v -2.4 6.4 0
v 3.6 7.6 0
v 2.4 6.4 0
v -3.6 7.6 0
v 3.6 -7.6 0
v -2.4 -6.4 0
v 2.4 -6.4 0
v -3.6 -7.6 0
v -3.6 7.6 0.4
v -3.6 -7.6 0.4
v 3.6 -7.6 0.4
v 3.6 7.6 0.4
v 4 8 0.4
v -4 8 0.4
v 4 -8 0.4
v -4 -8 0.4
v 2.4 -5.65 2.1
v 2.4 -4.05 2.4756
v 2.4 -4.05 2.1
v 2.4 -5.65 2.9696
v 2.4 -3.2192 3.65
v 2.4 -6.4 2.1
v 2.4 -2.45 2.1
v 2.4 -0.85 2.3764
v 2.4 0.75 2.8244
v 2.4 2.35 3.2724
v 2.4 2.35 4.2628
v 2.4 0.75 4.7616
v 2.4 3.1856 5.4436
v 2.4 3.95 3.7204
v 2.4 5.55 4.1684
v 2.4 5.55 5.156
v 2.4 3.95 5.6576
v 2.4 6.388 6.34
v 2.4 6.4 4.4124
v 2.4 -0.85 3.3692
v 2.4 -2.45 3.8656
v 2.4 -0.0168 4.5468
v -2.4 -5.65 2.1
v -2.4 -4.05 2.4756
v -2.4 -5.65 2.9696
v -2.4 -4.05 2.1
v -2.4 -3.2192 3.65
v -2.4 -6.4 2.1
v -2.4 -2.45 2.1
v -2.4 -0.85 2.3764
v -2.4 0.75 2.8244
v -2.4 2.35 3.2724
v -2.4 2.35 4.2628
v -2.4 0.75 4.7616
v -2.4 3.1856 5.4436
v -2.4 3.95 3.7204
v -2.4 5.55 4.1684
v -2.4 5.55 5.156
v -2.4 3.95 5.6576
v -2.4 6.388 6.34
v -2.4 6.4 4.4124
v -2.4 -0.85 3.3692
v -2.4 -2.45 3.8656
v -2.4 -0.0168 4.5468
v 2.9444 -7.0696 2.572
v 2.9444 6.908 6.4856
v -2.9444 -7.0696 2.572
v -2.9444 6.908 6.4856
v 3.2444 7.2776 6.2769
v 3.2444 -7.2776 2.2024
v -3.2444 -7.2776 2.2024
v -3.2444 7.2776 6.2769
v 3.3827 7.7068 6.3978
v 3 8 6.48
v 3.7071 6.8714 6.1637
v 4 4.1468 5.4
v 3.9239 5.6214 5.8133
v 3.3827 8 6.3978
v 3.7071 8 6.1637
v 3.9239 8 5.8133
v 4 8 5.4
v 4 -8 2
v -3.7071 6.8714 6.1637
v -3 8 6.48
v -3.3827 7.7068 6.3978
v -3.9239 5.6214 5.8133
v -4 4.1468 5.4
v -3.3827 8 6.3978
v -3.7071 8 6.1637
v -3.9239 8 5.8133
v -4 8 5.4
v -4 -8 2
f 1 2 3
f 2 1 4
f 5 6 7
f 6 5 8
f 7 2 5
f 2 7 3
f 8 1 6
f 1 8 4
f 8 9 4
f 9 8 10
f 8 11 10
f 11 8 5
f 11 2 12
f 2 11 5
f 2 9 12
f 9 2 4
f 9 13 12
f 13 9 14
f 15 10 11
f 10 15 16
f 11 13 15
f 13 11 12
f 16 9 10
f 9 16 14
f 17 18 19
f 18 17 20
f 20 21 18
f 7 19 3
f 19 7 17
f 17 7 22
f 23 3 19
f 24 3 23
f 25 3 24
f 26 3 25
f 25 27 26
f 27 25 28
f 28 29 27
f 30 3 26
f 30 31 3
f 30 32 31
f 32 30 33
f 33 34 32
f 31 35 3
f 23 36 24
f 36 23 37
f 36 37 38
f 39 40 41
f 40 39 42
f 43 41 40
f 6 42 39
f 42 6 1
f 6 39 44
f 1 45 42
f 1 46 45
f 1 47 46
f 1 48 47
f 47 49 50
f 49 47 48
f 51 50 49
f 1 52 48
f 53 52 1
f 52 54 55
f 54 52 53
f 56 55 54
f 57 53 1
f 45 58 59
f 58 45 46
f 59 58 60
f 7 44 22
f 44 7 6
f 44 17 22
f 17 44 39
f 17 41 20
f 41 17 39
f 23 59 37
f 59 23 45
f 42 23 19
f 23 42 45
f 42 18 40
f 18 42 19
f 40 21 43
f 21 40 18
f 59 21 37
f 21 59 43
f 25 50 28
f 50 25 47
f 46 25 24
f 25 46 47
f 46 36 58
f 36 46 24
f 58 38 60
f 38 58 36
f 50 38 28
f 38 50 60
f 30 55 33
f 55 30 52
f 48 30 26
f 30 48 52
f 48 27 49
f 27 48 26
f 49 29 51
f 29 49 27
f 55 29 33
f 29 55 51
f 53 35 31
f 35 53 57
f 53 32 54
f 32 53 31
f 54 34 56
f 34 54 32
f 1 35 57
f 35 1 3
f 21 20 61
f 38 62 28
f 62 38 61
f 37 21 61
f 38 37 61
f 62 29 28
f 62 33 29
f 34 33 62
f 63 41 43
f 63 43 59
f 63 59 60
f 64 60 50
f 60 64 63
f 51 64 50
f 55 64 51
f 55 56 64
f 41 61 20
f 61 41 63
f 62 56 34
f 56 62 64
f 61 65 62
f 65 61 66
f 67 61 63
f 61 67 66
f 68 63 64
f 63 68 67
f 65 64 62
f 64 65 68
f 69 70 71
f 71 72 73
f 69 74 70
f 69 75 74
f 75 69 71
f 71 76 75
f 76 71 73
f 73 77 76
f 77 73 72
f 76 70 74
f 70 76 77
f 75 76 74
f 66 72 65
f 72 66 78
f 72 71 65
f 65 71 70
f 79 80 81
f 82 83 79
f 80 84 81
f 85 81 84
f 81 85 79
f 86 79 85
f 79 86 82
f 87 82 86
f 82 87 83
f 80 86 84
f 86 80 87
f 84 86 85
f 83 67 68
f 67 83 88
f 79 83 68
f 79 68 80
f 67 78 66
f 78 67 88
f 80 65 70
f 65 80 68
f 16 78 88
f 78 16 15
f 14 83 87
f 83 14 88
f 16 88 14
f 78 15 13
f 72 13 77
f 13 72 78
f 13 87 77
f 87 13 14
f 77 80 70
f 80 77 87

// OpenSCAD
// file: ../p/recte4.scad
use <../lib.scad>
function ldraw_lib__recte4() = [
// 0 Rectangle Empty with 4 Edges
// 0 Name: recte4.dat
// 0 Author: Steffen [Steffen]
// 0 !LDRAW_ORG Primitive UPDATE 2010-03
// 0 !LICENSE Licensed under CC BY 4.0 : see CAreadme.txt
// 
// 0 BFC CERTIFY CCW
  [0,"BFC","CERTIFY"],
  [0,"BFC","CCW"],
// 
// 0 !HISTORY 2010-12-31 [PTadmin] Official Update 2010-03
// 
// 
// 2 24 1 0 1 -1 0 1
  [2,24,1,0,1,-1,0,1],
// 2 24 -1 0 1 -1 0 -1
  [2,24,-1,0,1,-1,0,-1],
// 2 24 -1 0 -1 1 0 -1
  [2,24,-1,0,-1,1,0,-1],
// 2 24 1 0 -1 1 0 1
  [2,24,1,0,-1,1,0,1],
];
module ldraw_lib__recte4(step=0, col=false, unit=2/5, alt=false, line=0.2, solid=!$preview)
    makepoly(ldraw_lib__recte4(), step=step, col=col, unit=unit, alt=alt, line=line, solid=solid);
ldraw_lib__recte4(line=0.2);
// file: ../p/rect3.scad
use <../lib.scad>
function ldraw_lib__rect3() = [
// 0 Rectangle with 3 Edges
// 0 Name: rect3.dat
// 0 Author: Mark Kennedy [mkennedy]
// 0 !LDRAW_ORG Primitive UPDATE 2010-01
// 0 !LICENSE Licensed under CC BY 4.0 : see CAreadme.txt
// 
// 0 BFC CERTIFY CCW
  [0,"BFC","CERTIFY"],
  [0,"BFC","CCW"],
// 
// 0 !HISTORY 2003-08-01 [PTadmin] Official Update 2003-02
// 0 !HISTORY 2007-06-24 [PTadmin] Header formatted for Contributor Agreement
// 0 !HISTORY 2008-07-01 [PTadmin] Official Update 2008-01
// 0 !HISTORY 2010-01-17 [mikeheide] Change winding to CCW
// 0 !HISTORY 2010-04-05 [PTadmin] Official Update 2010-01
// 
// 
// 2 24 1 0 1 -1 0 1
  [2,24,1,0,1,-1,0,1],
// 2 24 1 0 1 1 0 -1
  [2,24,1,0,1,1,0,-1],
// 2 24 -1 0 1 -1 0 -1
  [2,24,-1,0,1,-1,0,-1],
// 4 16 -1 0 1 -1 0 -1 1 0 -1 1 0 1
  [4,16,-1,0,1,-1,0,-1,1,0,-1,1,0,1],
// 0 //
];
module ldraw_lib__rect3(step=0, col=false, unit=2/5, alt=false, line=0.2, solid=!$preview)
    makepoly(ldraw_lib__rect3(), step=step, col=col, unit=unit, alt=alt, line=line, solid=solid);
ldraw_lib__rect3(line=0.2);
// file: ../p/rect2p.scad
use <../lib.scad>
function ldraw_lib__rect2p() = [
// 0 Rectangle with 2 Parallel Edges
// 0 Name: rect2p.dat
// 0 Author: Donald Sutter [technog]
// 0 !LDRAW_ORG Primitive UPDATE 2010-01
// 0 !LICENSE Licensed under CC BY 4.0 : see CAreadme.txt
// 
// 0 BFC CERTIFY CCW
  [0,"BFC","CERTIFY"],
  [0,"BFC","CCW"],
// 
// 0 !HISTORY 2003-08-01 [PTadmin] Official Update 2003-02
// 0 !HISTORY 2007-06-24 [PTadmin] Header formatted for Contributor Agreement
// 0 !HISTORY 2008-07-01 [PTadmin] Official Update 2008-01
// 0 !HISTORY 2010-01-17 [mikeheide] changed winding to CCW
// 0 !HISTORY 2010-04-05 [PTadmin] Official Update 2010-01
// 
// 
// 2 24 1 0 1 -1 0 1
  [2,24,1,0,1,-1,0,1],
// 2 24 -1 0 -1 1 0 -1
  [2,24,-1,0,-1,1,0,-1],
// 4 16 -1 0 1 -1 0 -1 1 0 -1 1 0 1
  [4,16,-1,0,1,-1,0,-1,1,0,-1,1,0,1],
// 0
];
module ldraw_lib__rect2p(step=0, col=false, unit=2/5, alt=false, line=0.2, solid=!$preview)
    makepoly(ldraw_lib__rect2p(), step=step, col=col, unit=unit, alt=alt, line=line, solid=solid);
ldraw_lib__rect2p(line=0.2);
// file: ../p/rect.scad
use <../lib.scad>
function ldraw_lib__rect() = [
// 0 Rectangle
// 0 Name: rect.dat
// 0 Author: James Jessiman
// 0 !LDRAW_ORG Primitive UPDATE 2010-01
// 0 !LICENSE Licensed under CC BY 4.0 : see CAreadme.txt
// 
// 0 BFC CERTIFY CCW
  [0,"BFC","CERTIFY"],
  [0,"BFC","CCW"],
// 
// 0 !HISTORY 2002-04-05 [hafhead] Added BFC statement
// 0 !HISTORY 2002-04-25 [PTadmin] Official Update 2002-02
// 0 !HISTORY 2007-06-24 [PTadmin] Header formatted for Contributor Agreement
// 0 !HISTORY 2008-07-01 [PTadmin] Official Update 2008-01
// 0 !HISTORY 2010-01-17 [mikeheide] changed winding to CCW
// 0 !HISTORY 2010-04-05 [PTadmin] Official Update 2010-01
// 
// 
// 2 24 1 0 1 -1 0 1
  [2,24,1,0,1,-1,0,1],
// 2 24 -1 0 1 -1 0 -1
  [2,24,-1,0,1,-1,0,-1],
// 2 24 -1 0 -1 1 0 -1
  [2,24,-1,0,-1,1,0,-1],
// 2 24 1 0 -1 1 0 1
  [2,24,1,0,-1,1,0,1],
// 4 16 -1 0 1 -1 0 -1 1 0 -1 1 0 1
  [4,16,-1,0,1,-1,0,-1,1,0,-1,1,0,1],
// 0
];
module ldraw_lib__rect(step=0, col=false, unit=2/5, alt=false, line=0.2, solid=!$preview)
    makepoly(ldraw_lib__rect(), step=step, col=col, unit=unit, alt=alt, line=line, solid=solid);
ldraw_lib__rect(line=0.2);
// file: ../p/box4.scad
use <../lib.scad>
function ldraw_lib__box4() = [
// 0 Box with 4 Faces (2 Parallel Pairs) and All Edges
// 0 Name: box4.dat
// 0 Author: James Jessiman
// 0 !LDRAW_ORG Primitive UPDATE 2012-01
// 0 !LICENSE Licensed under CC BY 4.0 : see CAreadme.txt
// 
// 0 BFC CERTIFY CCW
  [0,"BFC","CERTIFY"],
  [0,"BFC","CCW"],
// 
// 0 !HISTORY 2002-04-03 [sbliss] Modified for BFC compliance
// 0 !HISTORY 2002-04-25 [PTadmin] Official Update 2002-02
// 0 !HISTORY 2007-06-24 [PTadmin] Header formatted for Contributor Agreement
// 0 !HISTORY 2008-07-01 [PTadmin] Official Update 2008-01
// 0 !HISTORY 2012-02-16 [Philo] Changed to CCW
// 0 !HISTORY 2012-03-30 [PTadmin] Official Update 2012-01
// 
// 
// 2 24 1 1 1 -1 1 1
  [2,24,1,1,1,-1,1,1],
// 2 24 -1 1 1 -1 1 -1
  [2,24,-1,1,1,-1,1,-1],
// 2 24 -1 1 -1 1 1 -1
  [2,24,-1,1,-1,1,1,-1],
// 2 24 1 1 -1 1 1 1
  [2,24,1,1,-1,1,1,1],
// 2 24 1 0 1 -1 0 1
  [2,24,1,0,1,-1,0,1],
// 2 24 -1 0 1 -1 0 -1
  [2,24,-1,0,1,-1,0,-1],
// 2 24 -1 0 -1 1 0 -1
  [2,24,-1,0,-1,1,0,-1],
// 2 24 1 0 -1 1 0 1
  [2,24,1,0,-1,1,0,1],
// 2 24 1 0 1 1 1 1
  [2,24,1,0,1,1,1,1],
// 2 24 -1 0 1 -1 1 1
  [2,24,-1,0,1,-1,1,1],
// 2 24 1 0 -1 1 1 -1
  [2,24,1,0,-1,1,1,-1],
// 2 24 -1 0 -1 -1 1 -1
  [2,24,-1,0,-1,-1,1,-1],
// 4 16 -1 1 1 -1 0 1 1 0 1 1 1 1
  [4,16,-1,1,1,-1,0,1,1,0,1,1,1,1],
// 4 16 -1 1 -1 -1 0 -1 -1 0 1 -1 1 1
  [4,16,-1,1,-1,-1,0,-1,-1,0,1,-1,1,1],
// 4 16 1 1 -1 1 0 -1 -1 0 -1 -1 1 -1
  [4,16,1,1,-1,1,0,-1,-1,0,-1,-1,1,-1],
// 4 16 1 1 1 1 0 1 1 0 -1 1 1 -1
  [4,16,1,1,1,1,0,1,1,0,-1,1,1,-1],
];
module ldraw_lib__box4(step=0, col=false, unit=2/5, alt=false, line=0.2, solid=!$preview)
    makepoly(ldraw_lib__box4(), step=step, col=col, unit=unit, alt=alt, line=line, solid=solid);
ldraw_lib__box4(line=0.2);
// file: ../p/1-8chrd.scad
use <../lib.scad>
function ldraw_lib__1_8chrd() = [
// 0 Chord 0.125
// 0 Name: 1-8chrd.dat
// 0 Author: Orion Pobursky [OrionP]
// 0 !LDRAW_ORG Primitive UPDATE 2023-05
// 0 !LICENSE Licensed under CC BY 4.0 : see CAreadme.txt
// 
// 0 BFC CERTIFY CCW
  [0,"BFC","CERTIFY"],
  [0,"BFC","CCW"],
// 
// 0 !HISTORY 2004-04-22 [PTadmin] Official Update 2004-02
// 0 !HISTORY 2007-06-22 [PTadmin] Header formatted for Contributor Agreement
// 0 !HISTORY 2008-07-01 [PTadmin] Official Update 2008-01
// 0 !HISTORY 2023-10-27 [OrionP] Rebuilt with PrimGen2, original author westrate
// 0 !HISTORY 2023-10-31 [OrionP] Official Update 2023-05
// 
// 3 16 1 0 0 0.9239 0 0.3827 0.7071 0 0.7071
  [3,16,1,0,0,0.9239,0,0.3827,0.7071,0,0.7071],
];
module ldraw_lib__1_8chrd(step=0, col=false, unit=2/5, alt=false, line=0.2, solid=!$preview)
    makepoly(ldraw_lib__1_8chrd(), step=step, col=col, unit=unit, alt=alt, line=line, solid=solid);
ldraw_lib__1_8chrd(line=0.2);
// file: ../p/1-4edge.scad
use <../lib.scad>
function ldraw_lib__1_4edge() = [
// 0 Circle 0.25
// 0 Name: 1-4edge.dat
// 0 Author: James Jessiman
// 0 !LDRAW_ORG Primitive UPDATE 2017-01
// 0 !LICENSE Licensed under CC BY 4.0 : see CAreadme.txt
// 
// 0 BFC CERTIFY CCW
  [0,"BFC","CERTIFY"],
  [0,"BFC","CCW"],
// 
// 0 !HISTORY 2007-06-22 [PTadmin] Header formatted for Contributor Agreement
// 0 !HISTORY 2008-07-01 [PTadmin] Official Update 2008-01
// 0 !HISTORY 2017-01-15 [Steffen] BFCed
// 0 !HISTORY 2017-12-30 [PTadmin] Official Update 2017-01
// 
// 
// 2 24 1 0 0 0.9239 0 0.3827
  [2,24,1,0,0,0.9239,0,0.3827],
// 2 24 0.9239 0 0.3827 0.7071 0 0.7071
  [2,24,0.9239,0,0.3827,0.7071,0,0.7071],
// 2 24 0.7071 0 0.7071 0.3827 0 0.9239
  [2,24,0.7071,0,0.7071,0.3827,0,0.9239],
// 2 24 0.3827 0 0.9239 0 0 1
  [2,24,0.3827,0,0.9239,0,0,1],
];
module ldraw_lib__1_4edge(step=0, col=false, unit=2/5, alt=false, line=0.2, solid=!$preview)
    makepoly(ldraw_lib__1_4edge(), step=step, col=col, unit=unit, alt=alt, line=line, solid=solid);
ldraw_lib__1_4edge(line=0.2);
// file: ../p/1-4cyls.scad
use <../lib.scad>
function ldraw_lib__1_4cyls() = [
// 0 Cylinder Sloped 0.25
// 0 Name: 1-4cyls.dat
// 0 Author: James Jessiman
// 0 !LDRAW_ORG Primitive UPDATE 2012-01
// 0 !LICENSE Licensed under CC BY 4.0 : see CAreadme.txt
// 
// 0 BFC CERTIFY CCW
  [0,"BFC","CERTIFY"],
  [0,"BFC","CCW"],
// 
// 0 !HISTORY 1998-12-15 [PTadmin] Official Update 1998-10
// 0 !HISTORY 2002-07-03 [sbliss] Added BFC statement
// 0 !HISTORY 2002-08-18 [PTadmin] Official Update 2002-04
// 0 !HISTORY 2007-06-22 [PTadmin] Header formatted for Contributor Agreement
// 0 !HISTORY 2008-07-01 [PTadmin] Official Update 2008-01
// 0 !HISTORY 2012-02-16 [Philo] Changed to CCW
// 0 !HISTORY 2012-03-30 [PTadmin] Official Update 2012-01
// 
// 
// 3 16 0.9239 0.0761 0.3827 0.9239 0 0.3827 1 0 0
  [3,16,0.9239,0.0761,0.3827,0.9239,0,0.3827,1,0,0],
// 4 16 0.9239 0.0761 0.3827 0.7071 0.2929 0.7071 0.7071 0 0.7071 0.9239 0 0.3827
  [4,16,0.9239,0.0761,0.3827,0.7071,0.2929,0.7071,0.7071,0,0.7071,0.9239,0,0.3827],
// 4 16 0.7071 0.2929 0.7071 0.3827 0.6173 0.9239 0.3827 0 0.9239 0.7071 0 0.7071
  [4,16,0.7071,0.2929,0.7071,0.3827,0.6173,0.9239,0.3827,0,0.9239,0.7071,0,0.7071],
// 4 16 0.3827 0.6173 0.9239 0 1 1 0 0 1 0.3827 0 0.9239
  [4,16,0.3827,0.6173,0.9239,0,1,1,0,0,1,0.3827,0,0.9239],
// 
// 5 24 0.9239 0 0.3827 0.9239 0.0761 0.3827 0.7071 0 0.7071 1 0 0
  [5,24,0.9239,0,0.3827,0.9239,0.0761,0.3827,0.7071,0,0.7071,1,0,0],
// 5 24 0.7071 0 0.7071 0.7071 0.2929 0.7071 0.3827 0 0.9239 0.9239 0 0.3827
  [5,24,0.7071,0,0.7071,0.7071,0.2929,0.7071,0.3827,0,0.9239,0.9239,0,0.3827],
// 5 24 0.3827 0 0.9239 0.3827 0.6173 0.9239 0 0 1 0.7071 0 0.7071
  [5,24,0.3827,0,0.9239,0.3827,0.6173,0.9239,0,0,1,0.7071,0,0.7071],
// 5 24 0 0 1 0 1 1 0.3827 0 0.9239 -1 0 1
  [5,24,0,0,1,0,1,1,0.3827,0,0.9239,-1,0,1],
];
module ldraw_lib__1_4cyls(step=0, col=false, unit=2/5, alt=false, line=0.2, solid=!$preview)
    makepoly(ldraw_lib__1_4cyls(), step=step, col=col, unit=unit, alt=alt, line=line, solid=solid);
ldraw_lib__1_4cyls(line=0.2);
// file: ../p/1-4chrd.scad
use <../lib.scad>
function ldraw_lib__1_4chrd() = [
// 0 Chord 0.25
// 0 Name: 1-4chrd.dat
// 0 Author: Max Martin Richter [MMR1988]
// 0 !LDRAW_ORG Primitive UPDATE 2023-05
// 0 !LICENSE Licensed under CC BY 4.0 : see CAreadme.txt
// 
// 0 BFC CERTIFY CCW
  [0,"BFC","CERTIFY"],
  [0,"BFC","CCW"],
// 
// 0 !HISTORY 2004-04-22 [PTadmin] Official Update 2004-02
// 0 !HISTORY 2007-10-09 [PTadmin] Header formatted for Contributor Agreement
// 0 !HISTORY 2008-07-01 [PTadmin] Official Update 2008-01
// 0 !HISTORY 2012-08-02 [MMR1988] Re-creation with PrimGen2 and Rectifier
// 0 !HISTORY 2012-08-09 [PTadmin] Official Update 2012-02
// 0 !HISTORY 2023-10-27 [OrionP] Change author to MMR1988 from hafhead
// 0 !HISTORY 2023-10-31 [OrionP] Official Update 2023-05
// 
// 4 16 0.9239 0 0.3827 0.3827 0 0.9239 0 0 1 1 0 0
  [4,16,0.9239,0,0.3827,0.3827,0,0.9239,0,0,1,1,0,0],
// 3 16 0.7071 0 0.7071 0.3827 0 0.9239 0.9239 0 0.3827
  [3,16,0.7071,0,0.7071,0.3827,0,0.9239,0.9239,0,0.3827],
];
module ldraw_lib__1_4chrd(step=0, col=false, unit=2/5, alt=false, line=0.2, solid=!$preview)
    makepoly(ldraw_lib__1_4chrd(), step=step, col=col, unit=unit, alt=alt, line=line, solid=solid);
ldraw_lib__1_4chrd(line=0.2);
// main file
use <../lib.scad>
use <../p/1-4chrd.scad>
use <../p/1-4cyls.scad>
use <../p/1-4edge.scad>
use <../p/1-8chrd.scad>
use <../p/box4.scad>
use <../p/rect.scad>
use <../p/rect2p.scad>
use <../p/rect3.scad>
use <../p/recte4.scad>
function ldraw_lib__61409b() = [
// 0 Slope Brick 18  2 x  1 x  0.667 Grille
// 0 Name: 61409b.dat
// 0 Author: Gerald Lasser [GeraldLasser]
// 0 !LDRAW_ORG Part UPDATE 2025-02
// 0 !LICENSE Licensed under CC BY 4.0 : see CAreadme.txt
// 
// 0 BFC CERTIFY CCW
  [0,"BFC","CERTIFY"],
  [0,"BFC","CCW"],
// 
// 0 !KEYWORDS BrickLink 61409, Rebrickable 61409
// 
// 0 !HISTORY 2023-04-14 {LEGO Instructions App} Original part shape
// 0 !HISTORY 2023-04-14 [GeraldLasser] File preparation for LDraw Parts Tracker
// 0 !HISTORY 2025-02-27 [OrionP] Official Update 2025-02
// 
// 4 16 6 0 16 -6 0 16 -9 0 19 9 0 19
  [4,16,6,0,16,-6,0,16,-9,0,19,9,0,19],
// 4 16 -6 0 -16 6 0 -16 9 0 -19 -9 0 -19
  [4,16,-6,0,-16,6,0,-16,9,0,-19,-9,0,-19],
// 4 16 6 0 -16 6 0 16 9 0 19 9 0 -19
  [4,16,6,0,-16,6,0,16,9,0,19,9,0,-19],
// 4 16 -6 0 16 -6 0 -16 -9 0 -19 -9 0 19
  [4,16,-6,0,16,-6,0,-16,-9,0,-19,-9,0,19],
// 2 24 6 0 16 6 0 -16
  [2,24,6,0,16,6,0,-16],
// 2 24 -6 0 -16 -6 0 16
  [2,24,-6,0,-16,-6,0,16],
// 1 16 0 -1 0 0 0 -9 0 1 0 19 0 0 box4.dat
  [1,16,0,-1,0,0,0,-9,0,1,0,19,0,0, ldraw_lib__box4()],
// 4 16 9 -1 19 -9 -1 19 -10 -1 20 10 -1 20
  [4,16,9,-1,19,-9,-1,19,-10,-1,20,10,-1,20],
// 4 16 -9 -1 -19 9 -1 -19 10 -1 -20 -10 -1 -20
  [4,16,-9,-1,-19,9,-1,-19,10,-1,-20,-10,-1,-20],
// 4 16 9 -1 -19 9 -1 19 10 -1 20 10 -1 -20
  [4,16,9,-1,-19,9,-1,19,10,-1,20,10,-1,-20],
// 4 16 -9 -1 19 -9 -1 -19 -10 -1 -20 -10 -1 20
  [4,16,-9,-1,19,-9,-1,-19,-10,-1,-20,-10,-1,20],
// 1 16 0 -1 0 10 0 0 0 1 0 0 0 20 recte4.dat
  [1,16,0,-1,0,10,0,0,0,1,0,0,0,20, ldraw_lib__recte4()],
// 
// 4 16 6 -5.25 -10.125 6 -5.25 -14.125 6 -7.424 -14.125 6 -6.189 -10.125
  [4,16,6,-5.25,-10.125,6,-5.25,-14.125,6,-7.424,-14.125,6,-6.189,-10.125],
// 3 16 6 -7.424 -14.125 6 -9.125 -8.048 6 -6.189 -10.125
  [3,16,6,-7.424,-14.125,6,-9.125,-8.048,6,-6.189,-10.125],
// 4 16 6 0 -16 6 -5.25 -14.125 6 -5.25 -10.125 6 0 16
  [4,16,6,0,-16,6,-5.25,-14.125,6,-5.25,-10.125,6,0,16],
// 3 16 6 -5.25 -14.125 6 0 -16 6 -5.25 -16
  [3,16,6,-5.25,-14.125,6,0,-16,6,-5.25,-16],
// 3 16 6 -5.25 -6.125 6 0 16 6 -5.25 -10.125
  [3,16,6,-5.25,-6.125,6,0,16,6,-5.25,-10.125],
// 3 16 6 -5.941 -2.125 6 0 16 6 -5.25 -6.125
  [3,16,6,-5.941,-2.125,6,0,16,6,-5.25,-6.125],
// 3 16 6 -7.061 1.875 6 0 16 6 -5.941 -2.125
  [3,16,6,-7.061,1.875,6,0,16,6,-5.941,-2.125],
// 3 16 6 -8.181 5.875 6 0 16 6 -7.061 1.875
  [3,16,6,-8.181,5.875,6,0,16,6,-7.061,1.875],
// 4 16 6 -11.904 1.875 6 -10.657 5.875 6 -8.181 5.875 6 -7.061 1.875
  [4,16,6,-11.904,1.875,6,-10.657,5.875,6,-8.181,5.875,6,-7.061,1.875],
// 3 16 6 -11.904 1.875 6 -13.609 7.964 6 -10.657 5.875
  [3,16,6,-11.904,1.875,6,-13.609,7.964,6,-10.657,5.875],
// 3 16 6 -9.301 9.875 6 0 16 6 -8.181 5.875
  [3,16,6,-9.301,9.875,6,0,16,6,-8.181,5.875],
// 3 16 6 -9.301 9.875 6 -10.421 13.875 6 0 16
  [3,16,6,-9.301,9.875,6,-10.421,13.875,6,0,16],
// 4 16 6 -14.144 9.875 6 -12.89 13.875 6 -10.421 13.875 6 -9.301 9.875
  [4,16,6,-14.144,9.875,6,-12.89,13.875,6,-10.421,13.875,6,-9.301,9.875],
// 3 16 6 -14.144 9.875 6 -15.85 15.97 6 -12.89 13.875
  [3,16,6,-14.144,9.875,6,-15.85,15.97,6,-12.89,13.875],
// 3 16 6 -10.421 13.875 6 -11.031 16 6 0 16
  [3,16,6,-10.421,13.875,6,-11.031,16,6,0,16],
// 4 16 6 -9.664 -6.125 6 -8.423 -2.125 6 -5.941 -2.125 6 -5.25 -6.125
  [4,16,6,-9.664,-6.125,6,-8.423,-2.125,6,-5.941,-2.125,6,-5.25,-6.125],
// 3 16 6 -8.423 -2.125 6 -9.664 -6.125 6 -11.367 -.042
  [3,16,6,-8.423,-2.125,6,-9.664,-6.125,6,-11.367,-.042],
// 
// 4 16 -6 -7.424 -14.125 -6 -5.25 -14.125 -6 -5.25 -10.125 -6 -6.189 -10.125
  [4,16,-6,-7.424,-14.125,-6,-5.25,-14.125,-6,-5.25,-10.125,-6,-6.189,-10.125],
// 3 16 -6 -9.125 -8.048 -6 -7.424 -14.125 -6 -6.189 -10.125
  [3,16,-6,-9.125,-8.048,-6,-7.424,-14.125,-6,-6.189,-10.125],
// 4 16 -6 -5.25 -10.125 -6 -5.25 -14.125 -6 0 -16 -6 0 16
  [4,16,-6,-5.25,-10.125,-6,-5.25,-14.125,-6,0,-16,-6,0,16],
// 3 16 -6 0 -16 -6 -5.25 -14.125 -6 -5.25 -16
  [3,16,-6,0,-16,-6,-5.25,-14.125,-6,-5.25,-16],
// 3 16 -6 0 16 -6 -5.25 -6.125 -6 -5.25 -10.125
  [3,16,-6,0,16,-6,-5.25,-6.125,-6,-5.25,-10.125],
// 3 16 -6 0 16 -6 -5.941 -2.125 -6 -5.25 -6.125
  [3,16,-6,0,16,-6,-5.941,-2.125,-6,-5.25,-6.125],
// 3 16 -6 0 16 -6 -7.061 1.875 -6 -5.941 -2.125
  [3,16,-6,0,16,-6,-7.061,1.875,-6,-5.941,-2.125],
// 3 16 -6 0 16 -6 -8.181 5.875 -6 -7.061 1.875
  [3,16,-6,0,16,-6,-8.181,5.875,-6,-7.061,1.875],
// 4 16 -6 -8.181 5.875 -6 -10.657 5.875 -6 -11.904 1.875 -6 -7.061 1.875
  [4,16,-6,-8.181,5.875,-6,-10.657,5.875,-6,-11.904,1.875,-6,-7.061,1.875],
// 3 16 -6 -13.609 7.964 -6 -11.904 1.875 -6 -10.657 5.875
  [3,16,-6,-13.609,7.964,-6,-11.904,1.875,-6,-10.657,5.875],
// 3 16 -6 0 16 -6 -9.301 9.875 -6 -8.181 5.875
  [3,16,-6,0,16,-6,-9.301,9.875,-6,-8.181,5.875],
// 3 16 -6 -10.421 13.875 -6 -9.301 9.875 -6 0 16
  [3,16,-6,-10.421,13.875,-6,-9.301,9.875,-6,0,16],
// 4 16 -6 -10.421 13.875 -6 -12.89 13.875 -6 -14.144 9.875 -6 -9.301 9.875
  [4,16,-6,-10.421,13.875,-6,-12.89,13.875,-6,-14.144,9.875,-6,-9.301,9.875],
// 3 16 -6 -15.85 15.97 -6 -14.144 9.875 -6 -12.89 13.875
  [3,16,-6,-15.85,15.97,-6,-14.144,9.875,-6,-12.89,13.875],
// 3 16 -6 -11.031 16 -6 -10.421 13.875 -6 0 16
  [3,16,-6,-11.031,16,-6,-10.421,13.875,-6,0,16],
// 4 16 -6 -5.941 -2.125 -6 -8.423 -2.125 -6 -9.664 -6.125 -6 -5.25 -6.125
  [4,16,-6,-5.941,-2.125,-6,-8.423,-2.125,-6,-9.664,-6.125,-6,-5.25,-6.125],
// 3 16 -6 -9.664 -6.125 -6 -8.423 -2.125 -6 -11.367 -.042
  [3,16,-6,-9.664,-6.125,-6,-8.423,-2.125,-6,-11.367,-.042],
// 
// 1 16 0 -2.625 -16 6 0 0 0 0 2.625 0 -1 0 rect3.dat
  [1,16,0,-2.625,-16,6,0,0,0,0,2.625,0,-1,0, ldraw_lib__rect3()],
// 1 16 0 -5.25 -15.0625 6 0 0 0 -1 0 0 0 -.9375 rect.dat
  [1,16,0,-5.25,-15.0625,6,0,0,0,-1,0,0,0,-.9375, ldraw_lib__rect()],
// 1 16 0 -6.337 -14.125 -6 0 0 0 0 -1.087 0 -1 0 rect3.dat
  [1,16,0,-6.337,-14.125,-6,0,0,0,0,-1.087,0,-1,0, ldraw_lib__rect3()],
// 
// 1 16 0 -7.457 -6.125 6 0 0 0 0 2.207 0 -1 0 rect.dat
  [1,16,0,-7.457,-6.125,6,0,0,0,0,2.207,0,-1,0, ldraw_lib__rect()],
// 1 16 0 -5.25 -8.125 0 0 -6 0 -1 0 -2 0 0 rect2p.dat
  [1,16,0,-5.25,-8.125,0,0,-6,0,-1,0,-2,0,0, ldraw_lib__rect2p()],
// 1 16 0 -5.7195 -10.125 -6 0 0 0 0 .4695 0 1 0 rect3.dat
  [1,16,0,-5.7195,-10.125,-6,0,0,0,0,.4695,0,1,0, ldraw_lib__rect3()],
// 1 16 0 -7.657 -9.0865 0 0 -6 -1.468 1 0 1.0385 0 0 rect.dat
  [1,16,0,-7.657,-9.0865,0,0,-6,-1.468,1,0,1.0385,0,0, ldraw_lib__rect()],
// 4 16 -6 -9.664 -6.125 -6 -9.125 -8.048 6 -9.125 -8.048 6 -9.664 -6.125
  [4,16,-6,-9.664,-6.125,-6,-9.125,-8.048,6,-9.125,-8.048,6,-9.664,-6.125],
// 
// 1 16 0 -9.4825 1.875 0 0 -6 2.4215 0 0 0 -1 0 rect2p.dat
  [1,16,0,-9.4825,1.875,0,0,-6,2.4215,0,0,0,-1,0, ldraw_lib__rect2p()],
// 1 16 0 -6.501 -.125 6 0 0 0 -1 .56 0 0 -2 rect.dat
  [1,16,0,-6.501,-.125,6,0,0,0,-1,.56,0,0,-2, ldraw_lib__rect()],
// 1 16 0 -7.182 -2.125 0 0 -6 -1.241 0 0 0 1 0 rect2p.dat
  [1,16,0,-7.182,-2.125,0,0,-6,-1.241,0,0,0,1,0, ldraw_lib__rect2p()],
// 1 16 0 -9.895 -1.0835 -6 0 0 0 1 1.472 0 0 -1.0415 rect3.dat
  [1,16,0,-9.895,-1.0835,-6,0,0,0,1,1.472,0,0,-1.0415, ldraw_lib__rect3()],
// 1 16 0 -11.6355 .9165 -6 0 0 0 1 .2685 0 0 -.9585 rect2p.dat
  [1,16,0,-11.6355,.9165,-6,0,0,0,1,.2685,0,0,-.9585, ldraw_lib__rect2p()],
// 
// 1 16 0 -11.7225 9.875 0 0 -6 2.4215 0 0 0 -1 0 rect2p.dat
  [1,16,0,-11.7225,9.875,0,0,-6,2.4215,0,0,0,-1,0, ldraw_lib__rect2p()],
// 1 16 0 -8.741 7.875 6 0 0 0 -1 .56 0 0 -2 rect.dat
  [1,16,0,-8.741,7.875,6,0,0,0,-1,.56,0,0,-2, ldraw_lib__rect()],
// 1 16 0 -9.419 5.875 0 0 -6 -1.238 0 0 0 1 0 rect2p.dat
  [1,16,0,-9.419,5.875,0,0,-6,-1.238,0,0,0,1,0, ldraw_lib__rect2p()],
// 1 16 0 -12.133 6.9195 -6 0 0 0 1 1.476 0 0 -1.0445 rect3.dat
  [1,16,0,-12.133,6.9195,-6,0,0,0,1,1.476,0,0,-1.0445, ldraw_lib__rect3()],
// 1 16 0 -13.8765 8.9195 6 0 0 0 1 -.2675 0 0 .9555 rect2p.dat
  [1,16,0,-13.8765,8.9195,6,0,0,0,1,-.2675,0,0,.9555, ldraw_lib__rect2p()],
// 
// 1 16 0 -10.726 14.9375 0 0 -6 .305 -1 0 -1.0625 0 0 rect2p.dat
  [1,16,0,-10.726,14.9375,0,0,-6,.305,-1,0,-1.0625,0,0, ldraw_lib__rect2p()],
// 1 16 0 -11.6555 13.875 0 0 -6 -1.2345 0 0 0 1 0 rect.dat
  [1,16,0,-11.6555,13.875,0,0,-6,-1.2345,0,0,0,1,0, ldraw_lib__rect()],
// 1 16 0 -14.37 14.9225 6 0 0 0 1 -1.48 0 0 1.0475 rect3.dat
  [1,16,0,-14.37,14.9225,6,0,0,0,1,-1.48,0,0,1.0475, ldraw_lib__rect3()],
// 1 16 0 -5.5155 16 -6 0 0 0 0 5.5155 0 1 0 rect.dat
  [1,16,0,-5.5155,16,-6,0,0,0,0,5.5155,0,1,0, ldraw_lib__rect()],
// 
// 2 24 6 -7.424 -14.125 6 -9.125 -8.048
  [2,24,6,-7.424,-14.125,6,-9.125,-8.048],
// 2 24 6 -11.904 1.875 6 -13.609 7.964
  [2,24,6,-11.904,1.875,6,-13.609,7.964],
// 2 24 6 -14.144 9.875 6 -15.85 15.97
  [2,24,6,-14.144,9.875,6,-15.85,15.97],
// 2 24 6 -9.664 -6.125 6 -11.367 -.042
  [2,24,6,-9.664,-6.125,6,-11.367,-.042],
// 2 24 -6 -9.125 -8.048 -6 -7.424 -14.125
  [2,24,-6,-9.125,-8.048,-6,-7.424,-14.125],
// 2 24 -6 -13.609 7.964 -6 -11.904 1.875
  [2,24,-6,-13.609,7.964,-6,-11.904,1.875],
// 2 24 -6 -15.85 15.97 -6 -14.144 9.875
  [2,24,-6,-15.85,15.97,-6,-14.144,9.875],
// 2 24 -6 -11.367 -.042 -6 -9.664 -6.125
  [2,24,-6,-11.367,-.042,-6,-9.664,-6.125],
// 
// 3 16 6 -9.125 -8.048 6 -7.424 -14.125 7.361 -6.43 -17.674
  [3,16,6,-9.125,-8.048,6,-7.424,-14.125,7.361,-6.43,-17.674],
// 4 16 6 -11.904 1.875 6 -11.367 -.042 7.361 -6.43 -17.674 7.361 -16.214 17.27
  [4,16,6,-11.904,1.875,6,-11.367,-.042,7.361,-6.43,-17.674,7.361,-16.214,17.27],
// 3 16 6 -9.664 -6.125 6 -9.125 -8.048 7.361 -6.43 -17.674
  [3,16,6,-9.664,-6.125,6,-9.125,-8.048,7.361,-6.43,-17.674],
// 3 16 6 -11.367 -.042 6 -9.664 -6.125 7.361 -6.43 -17.674
  [3,16,6,-11.367,-.042,6,-9.664,-6.125,7.361,-6.43,-17.674],
// 3 16 7.361 -16.214 17.27 6 -13.609 7.964 6 -11.904 1.875
  [3,16,7.361,-16.214,17.27,6,-13.609,7.964,6,-11.904,1.875],
// 3 16 7.361 -16.214 17.27 6 -14.144 9.875 6 -13.609 7.964
  [3,16,7.361,-16.214,17.27,6,-14.144,9.875,6,-13.609,7.964],
// 3 16 6 -15.85 15.97 6 -14.144 9.875 7.361 -16.214 17.27
  [3,16,6,-15.85,15.97,6,-14.144,9.875,7.361,-16.214,17.27],
// 3 16 -7.361 -6.43 -17.674 -6 -7.424 -14.125 -6 -9.125 -8.048
  [3,16,-7.361,-6.43,-17.674,-6,-7.424,-14.125,-6,-9.125,-8.048],
// 3 16 -7.361 -6.43 -17.674 -6 -9.125 -8.048 -6 -9.664 -6.125
  [3,16,-7.361,-6.43,-17.674,-6,-9.125,-8.048,-6,-9.664,-6.125],
// 3 16 -7.361 -6.43 -17.674 -6 -9.664 -6.125 -6 -11.367 -.042
  [3,16,-7.361,-6.43,-17.674,-6,-9.664,-6.125,-6,-11.367,-.042],
// 4 16 -7.361 -6.43 -17.674 -6 -11.367 -.042 -6 -11.904 1.875 -7.361 -16.214 17.27
  [4,16,-7.361,-6.43,-17.674,-6,-11.367,-.042,-6,-11.904,1.875,-7.361,-16.214,17.27],
// 3 16 -6 -13.609 7.964 -7.361 -16.214 17.27 -6 -11.904 1.875
  [3,16,-6,-13.609,7.964,-7.361,-16.214,17.27,-6,-11.904,1.875],
// 3 16 -6 -14.144 9.875 -7.361 -16.214 17.27 -6 -13.609 7.964
  [3,16,-6,-14.144,9.875,-7.361,-16.214,17.27,-6,-13.609,7.964],
// 3 16 -6 -14.144 9.875 -6 -15.85 15.97 -7.361 -16.214 17.27
  [3,16,-6,-14.144,9.875,-6,-15.85,15.97,-7.361,-16.214,17.27],
// 4 16 -6 -7.424 -14.125 -7.361 -6.43 -17.674 7.361 -6.43 -17.674 6 -7.424 -14.125
  [4,16,-6,-7.424,-14.125,-7.361,-6.43,-17.674,7.361,-6.43,-17.674,6,-7.424,-14.125],
// 4 16 6 -15.85 15.97 7.361 -16.214 17.27 -7.361 -16.214 17.27 -6 -15.85 15.97
  [4,16,6,-15.85,15.97,7.361,-16.214,17.27,-7.361,-16.214,17.27,-6,-15.85,15.97],
// 2 24 -7.361 -16.214 17.27 7.361 -16.214 17.27
  [2,24,-7.361,-16.214,17.27,7.361,-16.214,17.27],
// 2 24 7.361 -16.214 17.27 8.111 -15.6922 18.194
  [2,24,7.361,-16.214,17.27,8.111,-15.6922,18.194],
// 2 24 7.361 -6.43 -17.674 8.111 -5.506 -18.194
  [2,24,7.361,-6.43,-17.674,8.111,-5.506,-18.194],
// 2 24 7.361 -16.214 17.27 7.361 -6.43 -17.674
  [2,24,7.361,-16.214,17.27,7.361,-6.43,-17.674],
// 2 24 7.361 -6.43 -17.674 -7.361 -6.43 -17.674
  [2,24,7.361,-6.43,-17.674,-7.361,-6.43,-17.674],
// 2 24 -8.111 -15.6922 18.194 -7.361 -16.214 17.27
  [2,24,-8.111,-15.6922,18.194,-7.361,-16.214,17.27],
// 2 24 -7.361 -6.43 -17.674 -7.361 -16.214 17.27
  [2,24,-7.361,-6.43,-17.674,-7.361,-16.214,17.27],
// 2 24 -8.111 -5.506 -18.194 -7.361 -6.43 -17.674
  [2,24,-8.111,-5.506,-18.194,-7.361,-6.43,-17.674],
// 
// 4 16 7.361 -16.214 17.27 7.361 -6.43 -17.674 8.111 -5.506 -18.194 8.111 -15.6922 18.194
  [4,16,7.361,-16.214,17.27,7.361,-6.43,-17.674,8.111,-5.506,-18.194,8.111,-15.6922,18.194],
// 4 16 -7.361 -6.43 -17.674 -8.111 -5.506 -18.194 8.111 -5.506 -18.194 7.361 -6.43 -17.674
  [4,16,-7.361,-6.43,-17.674,-8.111,-5.506,-18.194,8.111,-5.506,-18.194,7.361,-6.43,-17.674],
// 4 16 -7.361 -16.214 17.27 -8.111 -15.6922 18.194 -8.111 -5.506 -18.194 -7.361 -6.43 -17.674
  [4,16,-7.361,-16.214,17.27,-8.111,-15.6922,18.194,-8.111,-5.506,-18.194,-7.361,-6.43,-17.674],
// 4 16 7.361 -16.214 17.27 8.111 -15.6922 18.194 -8.111 -15.6922 18.194 -7.361 -16.214 17.27
  [4,16,7.361,-16.214,17.27,8.111,-15.6922,18.194,-8.111,-15.6922,18.194,-7.361,-16.214,17.27],
// 2 24 8.111 -5.506 -18.194 8.111 -15.6922 18.194
  [2,24,8.111,-5.506,-18.194,8.111,-15.6922,18.194],
// 2 24 -8.111 -15.6922 18.194 -8.111 -5.506 -18.194
  [2,24,-8.111,-15.6922,18.194,-8.111,-5.506,-18.194],
// 2 24 8.111 -5.506 -18.194 -8.111 -5.506 -18.194
  [2,24,8.111,-5.506,-18.194,-8.111,-5.506,-18.194],
// 2 24 -8.111 -15.6922 18.194 8.111 -15.6922 18.194
  [2,24,-8.111,-15.6922,18.194,8.111,-15.6922,18.194],
// 
// 1 16 7.5 -13.5 10.367 0 0 2.5 -2.7 0 0 9.633 1 0 1-8chrd.dat
  [1,16,7.5,-13.5,10.367,0,0,2.5,-2.7,0,0,9.633,1,0, ldraw_lib__1_8chrd()],
// 1 16 7.5 -13.5 10.367 2.5 0 0 0 0 -2.7 0 1 9.633 1-8chrd.dat
  [1,16,7.5,-13.5,10.367,2.5,0,0,0,0,-2.7,0,1,9.633, ldraw_lib__1_8chrd()],
// 1 16 7.5 -13.5 10.367 0 0 2.5 -2.7 0 0 9.633 1 0 1-4edge.dat
  [1,16,7.5,-13.5,10.367,0,0,2.5,-2.7,0,0,9.633,1,0, ldraw_lib__1_4edge()],
// 1 16 7.5 -13.5 20 0 0 2.5 -2.7 0 0 0 -9.633 0 1-4cyls.dat
  [1,16,7.5,-13.5,20,0,0,2.5,-2.7,0,0,0,-9.633,0, ldraw_lib__1_4cyls()],
// 1 16 7.5 -13.5 20 0 0 2.5 -2.7 0 0 0 1 0 1-4edge.dat
  [1,16,7.5,-13.5,20,0,0,2.5,-2.7,0,0,0,1,0, ldraw_lib__1_4edge()],
// 1 16 7.5 -13.5 20 0 0 2.5 -2.7 0 0 0 -1 0 1-4chrd.dat
  [1,16,7.5,-13.5,20,0,0,2.5,-2.7,0,0,0,-1,0, ldraw_lib__1_4chrd()],
// 4 16 8.111 -5.506 -18.194 10 -5 -20 10 -13.5 10.367 8.111 -15.6922 18.194
  [4,16,8.111,-5.506,-18.194,10,-5,-20,10,-13.5,10.367,8.111,-15.6922,18.194],
// 3 16 10 -13.5 10.367 9.26775 -15.40917 17.1784943 8.111 -15.6922 18.194
  [3,16,10,-13.5,10.367,9.26775,-15.40917,17.1784943,8.111,-15.6922,18.194],
// 3 16 8.111 -15.6922 18.194 9.26775 -15.40917 17.1784943 7.5 -16.2 20
  [3,16,8.111,-15.6922,18.194,9.26775,-15.40917,17.1784943,7.5,-16.2,20],
// 
// 1 16 -7.5 -13.5 10.367 0 0 -2.5 -2.7 0 0 9.633 1 0 1-8chrd.dat
  [1,16,-7.5,-13.5,10.367,0,0,-2.5,-2.7,0,0,9.633,1,0, ldraw_lib__1_8chrd()],
// 1 16 -7.5 -13.5 10.367 -2.5 0 0 0 0 -2.7 0 1 9.633 1-8chrd.dat
  [1,16,-7.5,-13.5,10.367,-2.5,0,0,0,0,-2.7,0,1,9.633, ldraw_lib__1_8chrd()],
// 1 16 -7.5 -13.5 10.367 0 0 -2.5 -2.7 0 0 9.633 1 0 1-4edge.dat
  [1,16,-7.5,-13.5,10.367,0,0,-2.5,-2.7,0,0,9.633,1,0, ldraw_lib__1_4edge()],
// 1 16 -7.5 -13.5 20 0 0 -2.5 -2.7 0 0 0 -9.633 0 1-4cyls.dat
  [1,16,-7.5,-13.5,20,0,0,-2.5,-2.7,0,0,0,-9.633,0, ldraw_lib__1_4cyls()],
// 1 16 -7.5 -13.5 20 0 0 -2.5 -2.7 0 0 0 1 0 1-4edge.dat
  [1,16,-7.5,-13.5,20,0,0,-2.5,-2.7,0,0,0,1,0, ldraw_lib__1_4edge()],
// 1 16 -7.5 -13.5 20 0 0 -2.5 -2.7 0 0 0 -1 0 1-4chrd.dat
  [1,16,-7.5,-13.5,20,0,0,-2.5,-2.7,0,0,0,-1,0, ldraw_lib__1_4chrd()],
// 4 16 -10 -13.5 10.367 -10 -5 -20 -8.111 -5.506 -18.194 -8.111 -15.6922 18.194
  [4,16,-10,-13.5,10.367,-10,-5,-20,-8.111,-5.506,-18.194,-8.111,-15.6922,18.194],
// 3 16 -9.26775 -15.40917 17.1784943 -10 -13.5 10.367 -8.111 -15.6922 18.194
  [3,16,-9.26775,-15.40917,17.1784943,-10,-13.5,10.367,-8.111,-15.6922,18.194],
// 3 16 -9.26775 -15.40917 17.1784943 -8.111 -15.6922 18.194 -7.5 -16.2 20
  [3,16,-9.26775,-15.40917,17.1784943,-8.111,-15.6922,18.194,-7.5,-16.2,20],
// 
// 4 16 8.111 -5.506 -18.194 -8.111 -5.506 -18.194 -10 -5 -20 10 -5 -20
  [4,16,8.111,-5.506,-18.194,-8.111,-5.506,-18.194,-10,-5,-20,10,-5,-20],
// 4 16 8.111 -15.6922 18.194 7.5 -16.2 20 -7.5 -16.2 20 -8.111 -15.6922 18.194
  [4,16,8.111,-15.6922,18.194,7.5,-16.2,20,-7.5,-16.2,20,-8.111,-15.6922,18.194],
// 2 24 -10 -13.5 10.367 -10 -5 -20
  [2,24,-10,-13.5,10.367,-10,-5,-20],
// 2 24 -10 -5 -20 10 -5 -20
  [2,24,-10,-5,-20,10,-5,-20],
// 2 24 10 -5 -20 10 -13.5 10.367
  [2,24,10,-5,-20,10,-13.5,10.367],
// 2 24 7.5 -16.2 20 -7.5 -16.2 20
  [2,24,7.5,-16.2,20,-7.5,-16.2,20],
// 
// 4 16 -10 -5 -20 -10 -1 -20 10 -1 -20 10 -5 -20
  [4,16,-10,-5,-20,-10,-1,-20,10,-1,-20,10,-5,-20],
// 4 16 -10 -13.5 10.367 -10 -13.5 20 -10 -1 20 -10 -5 -20
  [4,16,-10,-13.5,10.367,-10,-13.5,20,-10,-1,20,-10,-5,-20],
// 3 16 -10 -1 -20 -10 -5 -20 -10 -1 20
  [3,16,-10,-1,-20,-10,-5,-20,-10,-1,20],
// 3 16 10 -5 -20 10 -1 -20 10 -1 20
  [3,16,10,-5,-20,10,-1,-20,10,-1,20],
// 4 16 10 -13.5 10.367 10 -5 -20 10 -1 20 10 -13.5 20
  [4,16,10,-13.5,10.367,10,-5,-20,10,-1,20,10,-13.5,20],
// 4 16 10 -13.5 20 10 -1 20 -10 -1 20 -10 -13.5 20
  [4,16,10,-13.5,20,10,-1,20,-10,-1,20,-10,-13.5,20],
// 4 16 10 -13.5 20 -10 -13.5 20 -7.5 -16.2 20 7.5 -16.2 20
  [4,16,10,-13.5,20,-10,-13.5,20,-7.5,-16.2,20,7.5,-16.2,20],
// 2 24 10 -13.5 20 10 -1 20
  [2,24,10,-13.5,20,10,-1,20],
// 2 24 -10 -13.5 20 -10 -1 20
  [2,24,-10,-13.5,20,-10,-1,20],
// 2 24 -10 -5 -20 -10 -1 -20
  [2,24,-10,-5,-20,-10,-1,-20],
// 2 24 10 -5 -20 10 -1 -20
  [2,24,10,-5,-20,10,-1,-20],
];
module ldraw_lib__61409b(step=0, col=false, unit=2/5, alt=false, line=0.2, solid=!$preview)
    makepoly(ldraw_lib__61409b(), step=step, col=col, unit=unit, alt=alt, line=line, solid=solid);
ldraw_lib__61409b(line=0.2);
